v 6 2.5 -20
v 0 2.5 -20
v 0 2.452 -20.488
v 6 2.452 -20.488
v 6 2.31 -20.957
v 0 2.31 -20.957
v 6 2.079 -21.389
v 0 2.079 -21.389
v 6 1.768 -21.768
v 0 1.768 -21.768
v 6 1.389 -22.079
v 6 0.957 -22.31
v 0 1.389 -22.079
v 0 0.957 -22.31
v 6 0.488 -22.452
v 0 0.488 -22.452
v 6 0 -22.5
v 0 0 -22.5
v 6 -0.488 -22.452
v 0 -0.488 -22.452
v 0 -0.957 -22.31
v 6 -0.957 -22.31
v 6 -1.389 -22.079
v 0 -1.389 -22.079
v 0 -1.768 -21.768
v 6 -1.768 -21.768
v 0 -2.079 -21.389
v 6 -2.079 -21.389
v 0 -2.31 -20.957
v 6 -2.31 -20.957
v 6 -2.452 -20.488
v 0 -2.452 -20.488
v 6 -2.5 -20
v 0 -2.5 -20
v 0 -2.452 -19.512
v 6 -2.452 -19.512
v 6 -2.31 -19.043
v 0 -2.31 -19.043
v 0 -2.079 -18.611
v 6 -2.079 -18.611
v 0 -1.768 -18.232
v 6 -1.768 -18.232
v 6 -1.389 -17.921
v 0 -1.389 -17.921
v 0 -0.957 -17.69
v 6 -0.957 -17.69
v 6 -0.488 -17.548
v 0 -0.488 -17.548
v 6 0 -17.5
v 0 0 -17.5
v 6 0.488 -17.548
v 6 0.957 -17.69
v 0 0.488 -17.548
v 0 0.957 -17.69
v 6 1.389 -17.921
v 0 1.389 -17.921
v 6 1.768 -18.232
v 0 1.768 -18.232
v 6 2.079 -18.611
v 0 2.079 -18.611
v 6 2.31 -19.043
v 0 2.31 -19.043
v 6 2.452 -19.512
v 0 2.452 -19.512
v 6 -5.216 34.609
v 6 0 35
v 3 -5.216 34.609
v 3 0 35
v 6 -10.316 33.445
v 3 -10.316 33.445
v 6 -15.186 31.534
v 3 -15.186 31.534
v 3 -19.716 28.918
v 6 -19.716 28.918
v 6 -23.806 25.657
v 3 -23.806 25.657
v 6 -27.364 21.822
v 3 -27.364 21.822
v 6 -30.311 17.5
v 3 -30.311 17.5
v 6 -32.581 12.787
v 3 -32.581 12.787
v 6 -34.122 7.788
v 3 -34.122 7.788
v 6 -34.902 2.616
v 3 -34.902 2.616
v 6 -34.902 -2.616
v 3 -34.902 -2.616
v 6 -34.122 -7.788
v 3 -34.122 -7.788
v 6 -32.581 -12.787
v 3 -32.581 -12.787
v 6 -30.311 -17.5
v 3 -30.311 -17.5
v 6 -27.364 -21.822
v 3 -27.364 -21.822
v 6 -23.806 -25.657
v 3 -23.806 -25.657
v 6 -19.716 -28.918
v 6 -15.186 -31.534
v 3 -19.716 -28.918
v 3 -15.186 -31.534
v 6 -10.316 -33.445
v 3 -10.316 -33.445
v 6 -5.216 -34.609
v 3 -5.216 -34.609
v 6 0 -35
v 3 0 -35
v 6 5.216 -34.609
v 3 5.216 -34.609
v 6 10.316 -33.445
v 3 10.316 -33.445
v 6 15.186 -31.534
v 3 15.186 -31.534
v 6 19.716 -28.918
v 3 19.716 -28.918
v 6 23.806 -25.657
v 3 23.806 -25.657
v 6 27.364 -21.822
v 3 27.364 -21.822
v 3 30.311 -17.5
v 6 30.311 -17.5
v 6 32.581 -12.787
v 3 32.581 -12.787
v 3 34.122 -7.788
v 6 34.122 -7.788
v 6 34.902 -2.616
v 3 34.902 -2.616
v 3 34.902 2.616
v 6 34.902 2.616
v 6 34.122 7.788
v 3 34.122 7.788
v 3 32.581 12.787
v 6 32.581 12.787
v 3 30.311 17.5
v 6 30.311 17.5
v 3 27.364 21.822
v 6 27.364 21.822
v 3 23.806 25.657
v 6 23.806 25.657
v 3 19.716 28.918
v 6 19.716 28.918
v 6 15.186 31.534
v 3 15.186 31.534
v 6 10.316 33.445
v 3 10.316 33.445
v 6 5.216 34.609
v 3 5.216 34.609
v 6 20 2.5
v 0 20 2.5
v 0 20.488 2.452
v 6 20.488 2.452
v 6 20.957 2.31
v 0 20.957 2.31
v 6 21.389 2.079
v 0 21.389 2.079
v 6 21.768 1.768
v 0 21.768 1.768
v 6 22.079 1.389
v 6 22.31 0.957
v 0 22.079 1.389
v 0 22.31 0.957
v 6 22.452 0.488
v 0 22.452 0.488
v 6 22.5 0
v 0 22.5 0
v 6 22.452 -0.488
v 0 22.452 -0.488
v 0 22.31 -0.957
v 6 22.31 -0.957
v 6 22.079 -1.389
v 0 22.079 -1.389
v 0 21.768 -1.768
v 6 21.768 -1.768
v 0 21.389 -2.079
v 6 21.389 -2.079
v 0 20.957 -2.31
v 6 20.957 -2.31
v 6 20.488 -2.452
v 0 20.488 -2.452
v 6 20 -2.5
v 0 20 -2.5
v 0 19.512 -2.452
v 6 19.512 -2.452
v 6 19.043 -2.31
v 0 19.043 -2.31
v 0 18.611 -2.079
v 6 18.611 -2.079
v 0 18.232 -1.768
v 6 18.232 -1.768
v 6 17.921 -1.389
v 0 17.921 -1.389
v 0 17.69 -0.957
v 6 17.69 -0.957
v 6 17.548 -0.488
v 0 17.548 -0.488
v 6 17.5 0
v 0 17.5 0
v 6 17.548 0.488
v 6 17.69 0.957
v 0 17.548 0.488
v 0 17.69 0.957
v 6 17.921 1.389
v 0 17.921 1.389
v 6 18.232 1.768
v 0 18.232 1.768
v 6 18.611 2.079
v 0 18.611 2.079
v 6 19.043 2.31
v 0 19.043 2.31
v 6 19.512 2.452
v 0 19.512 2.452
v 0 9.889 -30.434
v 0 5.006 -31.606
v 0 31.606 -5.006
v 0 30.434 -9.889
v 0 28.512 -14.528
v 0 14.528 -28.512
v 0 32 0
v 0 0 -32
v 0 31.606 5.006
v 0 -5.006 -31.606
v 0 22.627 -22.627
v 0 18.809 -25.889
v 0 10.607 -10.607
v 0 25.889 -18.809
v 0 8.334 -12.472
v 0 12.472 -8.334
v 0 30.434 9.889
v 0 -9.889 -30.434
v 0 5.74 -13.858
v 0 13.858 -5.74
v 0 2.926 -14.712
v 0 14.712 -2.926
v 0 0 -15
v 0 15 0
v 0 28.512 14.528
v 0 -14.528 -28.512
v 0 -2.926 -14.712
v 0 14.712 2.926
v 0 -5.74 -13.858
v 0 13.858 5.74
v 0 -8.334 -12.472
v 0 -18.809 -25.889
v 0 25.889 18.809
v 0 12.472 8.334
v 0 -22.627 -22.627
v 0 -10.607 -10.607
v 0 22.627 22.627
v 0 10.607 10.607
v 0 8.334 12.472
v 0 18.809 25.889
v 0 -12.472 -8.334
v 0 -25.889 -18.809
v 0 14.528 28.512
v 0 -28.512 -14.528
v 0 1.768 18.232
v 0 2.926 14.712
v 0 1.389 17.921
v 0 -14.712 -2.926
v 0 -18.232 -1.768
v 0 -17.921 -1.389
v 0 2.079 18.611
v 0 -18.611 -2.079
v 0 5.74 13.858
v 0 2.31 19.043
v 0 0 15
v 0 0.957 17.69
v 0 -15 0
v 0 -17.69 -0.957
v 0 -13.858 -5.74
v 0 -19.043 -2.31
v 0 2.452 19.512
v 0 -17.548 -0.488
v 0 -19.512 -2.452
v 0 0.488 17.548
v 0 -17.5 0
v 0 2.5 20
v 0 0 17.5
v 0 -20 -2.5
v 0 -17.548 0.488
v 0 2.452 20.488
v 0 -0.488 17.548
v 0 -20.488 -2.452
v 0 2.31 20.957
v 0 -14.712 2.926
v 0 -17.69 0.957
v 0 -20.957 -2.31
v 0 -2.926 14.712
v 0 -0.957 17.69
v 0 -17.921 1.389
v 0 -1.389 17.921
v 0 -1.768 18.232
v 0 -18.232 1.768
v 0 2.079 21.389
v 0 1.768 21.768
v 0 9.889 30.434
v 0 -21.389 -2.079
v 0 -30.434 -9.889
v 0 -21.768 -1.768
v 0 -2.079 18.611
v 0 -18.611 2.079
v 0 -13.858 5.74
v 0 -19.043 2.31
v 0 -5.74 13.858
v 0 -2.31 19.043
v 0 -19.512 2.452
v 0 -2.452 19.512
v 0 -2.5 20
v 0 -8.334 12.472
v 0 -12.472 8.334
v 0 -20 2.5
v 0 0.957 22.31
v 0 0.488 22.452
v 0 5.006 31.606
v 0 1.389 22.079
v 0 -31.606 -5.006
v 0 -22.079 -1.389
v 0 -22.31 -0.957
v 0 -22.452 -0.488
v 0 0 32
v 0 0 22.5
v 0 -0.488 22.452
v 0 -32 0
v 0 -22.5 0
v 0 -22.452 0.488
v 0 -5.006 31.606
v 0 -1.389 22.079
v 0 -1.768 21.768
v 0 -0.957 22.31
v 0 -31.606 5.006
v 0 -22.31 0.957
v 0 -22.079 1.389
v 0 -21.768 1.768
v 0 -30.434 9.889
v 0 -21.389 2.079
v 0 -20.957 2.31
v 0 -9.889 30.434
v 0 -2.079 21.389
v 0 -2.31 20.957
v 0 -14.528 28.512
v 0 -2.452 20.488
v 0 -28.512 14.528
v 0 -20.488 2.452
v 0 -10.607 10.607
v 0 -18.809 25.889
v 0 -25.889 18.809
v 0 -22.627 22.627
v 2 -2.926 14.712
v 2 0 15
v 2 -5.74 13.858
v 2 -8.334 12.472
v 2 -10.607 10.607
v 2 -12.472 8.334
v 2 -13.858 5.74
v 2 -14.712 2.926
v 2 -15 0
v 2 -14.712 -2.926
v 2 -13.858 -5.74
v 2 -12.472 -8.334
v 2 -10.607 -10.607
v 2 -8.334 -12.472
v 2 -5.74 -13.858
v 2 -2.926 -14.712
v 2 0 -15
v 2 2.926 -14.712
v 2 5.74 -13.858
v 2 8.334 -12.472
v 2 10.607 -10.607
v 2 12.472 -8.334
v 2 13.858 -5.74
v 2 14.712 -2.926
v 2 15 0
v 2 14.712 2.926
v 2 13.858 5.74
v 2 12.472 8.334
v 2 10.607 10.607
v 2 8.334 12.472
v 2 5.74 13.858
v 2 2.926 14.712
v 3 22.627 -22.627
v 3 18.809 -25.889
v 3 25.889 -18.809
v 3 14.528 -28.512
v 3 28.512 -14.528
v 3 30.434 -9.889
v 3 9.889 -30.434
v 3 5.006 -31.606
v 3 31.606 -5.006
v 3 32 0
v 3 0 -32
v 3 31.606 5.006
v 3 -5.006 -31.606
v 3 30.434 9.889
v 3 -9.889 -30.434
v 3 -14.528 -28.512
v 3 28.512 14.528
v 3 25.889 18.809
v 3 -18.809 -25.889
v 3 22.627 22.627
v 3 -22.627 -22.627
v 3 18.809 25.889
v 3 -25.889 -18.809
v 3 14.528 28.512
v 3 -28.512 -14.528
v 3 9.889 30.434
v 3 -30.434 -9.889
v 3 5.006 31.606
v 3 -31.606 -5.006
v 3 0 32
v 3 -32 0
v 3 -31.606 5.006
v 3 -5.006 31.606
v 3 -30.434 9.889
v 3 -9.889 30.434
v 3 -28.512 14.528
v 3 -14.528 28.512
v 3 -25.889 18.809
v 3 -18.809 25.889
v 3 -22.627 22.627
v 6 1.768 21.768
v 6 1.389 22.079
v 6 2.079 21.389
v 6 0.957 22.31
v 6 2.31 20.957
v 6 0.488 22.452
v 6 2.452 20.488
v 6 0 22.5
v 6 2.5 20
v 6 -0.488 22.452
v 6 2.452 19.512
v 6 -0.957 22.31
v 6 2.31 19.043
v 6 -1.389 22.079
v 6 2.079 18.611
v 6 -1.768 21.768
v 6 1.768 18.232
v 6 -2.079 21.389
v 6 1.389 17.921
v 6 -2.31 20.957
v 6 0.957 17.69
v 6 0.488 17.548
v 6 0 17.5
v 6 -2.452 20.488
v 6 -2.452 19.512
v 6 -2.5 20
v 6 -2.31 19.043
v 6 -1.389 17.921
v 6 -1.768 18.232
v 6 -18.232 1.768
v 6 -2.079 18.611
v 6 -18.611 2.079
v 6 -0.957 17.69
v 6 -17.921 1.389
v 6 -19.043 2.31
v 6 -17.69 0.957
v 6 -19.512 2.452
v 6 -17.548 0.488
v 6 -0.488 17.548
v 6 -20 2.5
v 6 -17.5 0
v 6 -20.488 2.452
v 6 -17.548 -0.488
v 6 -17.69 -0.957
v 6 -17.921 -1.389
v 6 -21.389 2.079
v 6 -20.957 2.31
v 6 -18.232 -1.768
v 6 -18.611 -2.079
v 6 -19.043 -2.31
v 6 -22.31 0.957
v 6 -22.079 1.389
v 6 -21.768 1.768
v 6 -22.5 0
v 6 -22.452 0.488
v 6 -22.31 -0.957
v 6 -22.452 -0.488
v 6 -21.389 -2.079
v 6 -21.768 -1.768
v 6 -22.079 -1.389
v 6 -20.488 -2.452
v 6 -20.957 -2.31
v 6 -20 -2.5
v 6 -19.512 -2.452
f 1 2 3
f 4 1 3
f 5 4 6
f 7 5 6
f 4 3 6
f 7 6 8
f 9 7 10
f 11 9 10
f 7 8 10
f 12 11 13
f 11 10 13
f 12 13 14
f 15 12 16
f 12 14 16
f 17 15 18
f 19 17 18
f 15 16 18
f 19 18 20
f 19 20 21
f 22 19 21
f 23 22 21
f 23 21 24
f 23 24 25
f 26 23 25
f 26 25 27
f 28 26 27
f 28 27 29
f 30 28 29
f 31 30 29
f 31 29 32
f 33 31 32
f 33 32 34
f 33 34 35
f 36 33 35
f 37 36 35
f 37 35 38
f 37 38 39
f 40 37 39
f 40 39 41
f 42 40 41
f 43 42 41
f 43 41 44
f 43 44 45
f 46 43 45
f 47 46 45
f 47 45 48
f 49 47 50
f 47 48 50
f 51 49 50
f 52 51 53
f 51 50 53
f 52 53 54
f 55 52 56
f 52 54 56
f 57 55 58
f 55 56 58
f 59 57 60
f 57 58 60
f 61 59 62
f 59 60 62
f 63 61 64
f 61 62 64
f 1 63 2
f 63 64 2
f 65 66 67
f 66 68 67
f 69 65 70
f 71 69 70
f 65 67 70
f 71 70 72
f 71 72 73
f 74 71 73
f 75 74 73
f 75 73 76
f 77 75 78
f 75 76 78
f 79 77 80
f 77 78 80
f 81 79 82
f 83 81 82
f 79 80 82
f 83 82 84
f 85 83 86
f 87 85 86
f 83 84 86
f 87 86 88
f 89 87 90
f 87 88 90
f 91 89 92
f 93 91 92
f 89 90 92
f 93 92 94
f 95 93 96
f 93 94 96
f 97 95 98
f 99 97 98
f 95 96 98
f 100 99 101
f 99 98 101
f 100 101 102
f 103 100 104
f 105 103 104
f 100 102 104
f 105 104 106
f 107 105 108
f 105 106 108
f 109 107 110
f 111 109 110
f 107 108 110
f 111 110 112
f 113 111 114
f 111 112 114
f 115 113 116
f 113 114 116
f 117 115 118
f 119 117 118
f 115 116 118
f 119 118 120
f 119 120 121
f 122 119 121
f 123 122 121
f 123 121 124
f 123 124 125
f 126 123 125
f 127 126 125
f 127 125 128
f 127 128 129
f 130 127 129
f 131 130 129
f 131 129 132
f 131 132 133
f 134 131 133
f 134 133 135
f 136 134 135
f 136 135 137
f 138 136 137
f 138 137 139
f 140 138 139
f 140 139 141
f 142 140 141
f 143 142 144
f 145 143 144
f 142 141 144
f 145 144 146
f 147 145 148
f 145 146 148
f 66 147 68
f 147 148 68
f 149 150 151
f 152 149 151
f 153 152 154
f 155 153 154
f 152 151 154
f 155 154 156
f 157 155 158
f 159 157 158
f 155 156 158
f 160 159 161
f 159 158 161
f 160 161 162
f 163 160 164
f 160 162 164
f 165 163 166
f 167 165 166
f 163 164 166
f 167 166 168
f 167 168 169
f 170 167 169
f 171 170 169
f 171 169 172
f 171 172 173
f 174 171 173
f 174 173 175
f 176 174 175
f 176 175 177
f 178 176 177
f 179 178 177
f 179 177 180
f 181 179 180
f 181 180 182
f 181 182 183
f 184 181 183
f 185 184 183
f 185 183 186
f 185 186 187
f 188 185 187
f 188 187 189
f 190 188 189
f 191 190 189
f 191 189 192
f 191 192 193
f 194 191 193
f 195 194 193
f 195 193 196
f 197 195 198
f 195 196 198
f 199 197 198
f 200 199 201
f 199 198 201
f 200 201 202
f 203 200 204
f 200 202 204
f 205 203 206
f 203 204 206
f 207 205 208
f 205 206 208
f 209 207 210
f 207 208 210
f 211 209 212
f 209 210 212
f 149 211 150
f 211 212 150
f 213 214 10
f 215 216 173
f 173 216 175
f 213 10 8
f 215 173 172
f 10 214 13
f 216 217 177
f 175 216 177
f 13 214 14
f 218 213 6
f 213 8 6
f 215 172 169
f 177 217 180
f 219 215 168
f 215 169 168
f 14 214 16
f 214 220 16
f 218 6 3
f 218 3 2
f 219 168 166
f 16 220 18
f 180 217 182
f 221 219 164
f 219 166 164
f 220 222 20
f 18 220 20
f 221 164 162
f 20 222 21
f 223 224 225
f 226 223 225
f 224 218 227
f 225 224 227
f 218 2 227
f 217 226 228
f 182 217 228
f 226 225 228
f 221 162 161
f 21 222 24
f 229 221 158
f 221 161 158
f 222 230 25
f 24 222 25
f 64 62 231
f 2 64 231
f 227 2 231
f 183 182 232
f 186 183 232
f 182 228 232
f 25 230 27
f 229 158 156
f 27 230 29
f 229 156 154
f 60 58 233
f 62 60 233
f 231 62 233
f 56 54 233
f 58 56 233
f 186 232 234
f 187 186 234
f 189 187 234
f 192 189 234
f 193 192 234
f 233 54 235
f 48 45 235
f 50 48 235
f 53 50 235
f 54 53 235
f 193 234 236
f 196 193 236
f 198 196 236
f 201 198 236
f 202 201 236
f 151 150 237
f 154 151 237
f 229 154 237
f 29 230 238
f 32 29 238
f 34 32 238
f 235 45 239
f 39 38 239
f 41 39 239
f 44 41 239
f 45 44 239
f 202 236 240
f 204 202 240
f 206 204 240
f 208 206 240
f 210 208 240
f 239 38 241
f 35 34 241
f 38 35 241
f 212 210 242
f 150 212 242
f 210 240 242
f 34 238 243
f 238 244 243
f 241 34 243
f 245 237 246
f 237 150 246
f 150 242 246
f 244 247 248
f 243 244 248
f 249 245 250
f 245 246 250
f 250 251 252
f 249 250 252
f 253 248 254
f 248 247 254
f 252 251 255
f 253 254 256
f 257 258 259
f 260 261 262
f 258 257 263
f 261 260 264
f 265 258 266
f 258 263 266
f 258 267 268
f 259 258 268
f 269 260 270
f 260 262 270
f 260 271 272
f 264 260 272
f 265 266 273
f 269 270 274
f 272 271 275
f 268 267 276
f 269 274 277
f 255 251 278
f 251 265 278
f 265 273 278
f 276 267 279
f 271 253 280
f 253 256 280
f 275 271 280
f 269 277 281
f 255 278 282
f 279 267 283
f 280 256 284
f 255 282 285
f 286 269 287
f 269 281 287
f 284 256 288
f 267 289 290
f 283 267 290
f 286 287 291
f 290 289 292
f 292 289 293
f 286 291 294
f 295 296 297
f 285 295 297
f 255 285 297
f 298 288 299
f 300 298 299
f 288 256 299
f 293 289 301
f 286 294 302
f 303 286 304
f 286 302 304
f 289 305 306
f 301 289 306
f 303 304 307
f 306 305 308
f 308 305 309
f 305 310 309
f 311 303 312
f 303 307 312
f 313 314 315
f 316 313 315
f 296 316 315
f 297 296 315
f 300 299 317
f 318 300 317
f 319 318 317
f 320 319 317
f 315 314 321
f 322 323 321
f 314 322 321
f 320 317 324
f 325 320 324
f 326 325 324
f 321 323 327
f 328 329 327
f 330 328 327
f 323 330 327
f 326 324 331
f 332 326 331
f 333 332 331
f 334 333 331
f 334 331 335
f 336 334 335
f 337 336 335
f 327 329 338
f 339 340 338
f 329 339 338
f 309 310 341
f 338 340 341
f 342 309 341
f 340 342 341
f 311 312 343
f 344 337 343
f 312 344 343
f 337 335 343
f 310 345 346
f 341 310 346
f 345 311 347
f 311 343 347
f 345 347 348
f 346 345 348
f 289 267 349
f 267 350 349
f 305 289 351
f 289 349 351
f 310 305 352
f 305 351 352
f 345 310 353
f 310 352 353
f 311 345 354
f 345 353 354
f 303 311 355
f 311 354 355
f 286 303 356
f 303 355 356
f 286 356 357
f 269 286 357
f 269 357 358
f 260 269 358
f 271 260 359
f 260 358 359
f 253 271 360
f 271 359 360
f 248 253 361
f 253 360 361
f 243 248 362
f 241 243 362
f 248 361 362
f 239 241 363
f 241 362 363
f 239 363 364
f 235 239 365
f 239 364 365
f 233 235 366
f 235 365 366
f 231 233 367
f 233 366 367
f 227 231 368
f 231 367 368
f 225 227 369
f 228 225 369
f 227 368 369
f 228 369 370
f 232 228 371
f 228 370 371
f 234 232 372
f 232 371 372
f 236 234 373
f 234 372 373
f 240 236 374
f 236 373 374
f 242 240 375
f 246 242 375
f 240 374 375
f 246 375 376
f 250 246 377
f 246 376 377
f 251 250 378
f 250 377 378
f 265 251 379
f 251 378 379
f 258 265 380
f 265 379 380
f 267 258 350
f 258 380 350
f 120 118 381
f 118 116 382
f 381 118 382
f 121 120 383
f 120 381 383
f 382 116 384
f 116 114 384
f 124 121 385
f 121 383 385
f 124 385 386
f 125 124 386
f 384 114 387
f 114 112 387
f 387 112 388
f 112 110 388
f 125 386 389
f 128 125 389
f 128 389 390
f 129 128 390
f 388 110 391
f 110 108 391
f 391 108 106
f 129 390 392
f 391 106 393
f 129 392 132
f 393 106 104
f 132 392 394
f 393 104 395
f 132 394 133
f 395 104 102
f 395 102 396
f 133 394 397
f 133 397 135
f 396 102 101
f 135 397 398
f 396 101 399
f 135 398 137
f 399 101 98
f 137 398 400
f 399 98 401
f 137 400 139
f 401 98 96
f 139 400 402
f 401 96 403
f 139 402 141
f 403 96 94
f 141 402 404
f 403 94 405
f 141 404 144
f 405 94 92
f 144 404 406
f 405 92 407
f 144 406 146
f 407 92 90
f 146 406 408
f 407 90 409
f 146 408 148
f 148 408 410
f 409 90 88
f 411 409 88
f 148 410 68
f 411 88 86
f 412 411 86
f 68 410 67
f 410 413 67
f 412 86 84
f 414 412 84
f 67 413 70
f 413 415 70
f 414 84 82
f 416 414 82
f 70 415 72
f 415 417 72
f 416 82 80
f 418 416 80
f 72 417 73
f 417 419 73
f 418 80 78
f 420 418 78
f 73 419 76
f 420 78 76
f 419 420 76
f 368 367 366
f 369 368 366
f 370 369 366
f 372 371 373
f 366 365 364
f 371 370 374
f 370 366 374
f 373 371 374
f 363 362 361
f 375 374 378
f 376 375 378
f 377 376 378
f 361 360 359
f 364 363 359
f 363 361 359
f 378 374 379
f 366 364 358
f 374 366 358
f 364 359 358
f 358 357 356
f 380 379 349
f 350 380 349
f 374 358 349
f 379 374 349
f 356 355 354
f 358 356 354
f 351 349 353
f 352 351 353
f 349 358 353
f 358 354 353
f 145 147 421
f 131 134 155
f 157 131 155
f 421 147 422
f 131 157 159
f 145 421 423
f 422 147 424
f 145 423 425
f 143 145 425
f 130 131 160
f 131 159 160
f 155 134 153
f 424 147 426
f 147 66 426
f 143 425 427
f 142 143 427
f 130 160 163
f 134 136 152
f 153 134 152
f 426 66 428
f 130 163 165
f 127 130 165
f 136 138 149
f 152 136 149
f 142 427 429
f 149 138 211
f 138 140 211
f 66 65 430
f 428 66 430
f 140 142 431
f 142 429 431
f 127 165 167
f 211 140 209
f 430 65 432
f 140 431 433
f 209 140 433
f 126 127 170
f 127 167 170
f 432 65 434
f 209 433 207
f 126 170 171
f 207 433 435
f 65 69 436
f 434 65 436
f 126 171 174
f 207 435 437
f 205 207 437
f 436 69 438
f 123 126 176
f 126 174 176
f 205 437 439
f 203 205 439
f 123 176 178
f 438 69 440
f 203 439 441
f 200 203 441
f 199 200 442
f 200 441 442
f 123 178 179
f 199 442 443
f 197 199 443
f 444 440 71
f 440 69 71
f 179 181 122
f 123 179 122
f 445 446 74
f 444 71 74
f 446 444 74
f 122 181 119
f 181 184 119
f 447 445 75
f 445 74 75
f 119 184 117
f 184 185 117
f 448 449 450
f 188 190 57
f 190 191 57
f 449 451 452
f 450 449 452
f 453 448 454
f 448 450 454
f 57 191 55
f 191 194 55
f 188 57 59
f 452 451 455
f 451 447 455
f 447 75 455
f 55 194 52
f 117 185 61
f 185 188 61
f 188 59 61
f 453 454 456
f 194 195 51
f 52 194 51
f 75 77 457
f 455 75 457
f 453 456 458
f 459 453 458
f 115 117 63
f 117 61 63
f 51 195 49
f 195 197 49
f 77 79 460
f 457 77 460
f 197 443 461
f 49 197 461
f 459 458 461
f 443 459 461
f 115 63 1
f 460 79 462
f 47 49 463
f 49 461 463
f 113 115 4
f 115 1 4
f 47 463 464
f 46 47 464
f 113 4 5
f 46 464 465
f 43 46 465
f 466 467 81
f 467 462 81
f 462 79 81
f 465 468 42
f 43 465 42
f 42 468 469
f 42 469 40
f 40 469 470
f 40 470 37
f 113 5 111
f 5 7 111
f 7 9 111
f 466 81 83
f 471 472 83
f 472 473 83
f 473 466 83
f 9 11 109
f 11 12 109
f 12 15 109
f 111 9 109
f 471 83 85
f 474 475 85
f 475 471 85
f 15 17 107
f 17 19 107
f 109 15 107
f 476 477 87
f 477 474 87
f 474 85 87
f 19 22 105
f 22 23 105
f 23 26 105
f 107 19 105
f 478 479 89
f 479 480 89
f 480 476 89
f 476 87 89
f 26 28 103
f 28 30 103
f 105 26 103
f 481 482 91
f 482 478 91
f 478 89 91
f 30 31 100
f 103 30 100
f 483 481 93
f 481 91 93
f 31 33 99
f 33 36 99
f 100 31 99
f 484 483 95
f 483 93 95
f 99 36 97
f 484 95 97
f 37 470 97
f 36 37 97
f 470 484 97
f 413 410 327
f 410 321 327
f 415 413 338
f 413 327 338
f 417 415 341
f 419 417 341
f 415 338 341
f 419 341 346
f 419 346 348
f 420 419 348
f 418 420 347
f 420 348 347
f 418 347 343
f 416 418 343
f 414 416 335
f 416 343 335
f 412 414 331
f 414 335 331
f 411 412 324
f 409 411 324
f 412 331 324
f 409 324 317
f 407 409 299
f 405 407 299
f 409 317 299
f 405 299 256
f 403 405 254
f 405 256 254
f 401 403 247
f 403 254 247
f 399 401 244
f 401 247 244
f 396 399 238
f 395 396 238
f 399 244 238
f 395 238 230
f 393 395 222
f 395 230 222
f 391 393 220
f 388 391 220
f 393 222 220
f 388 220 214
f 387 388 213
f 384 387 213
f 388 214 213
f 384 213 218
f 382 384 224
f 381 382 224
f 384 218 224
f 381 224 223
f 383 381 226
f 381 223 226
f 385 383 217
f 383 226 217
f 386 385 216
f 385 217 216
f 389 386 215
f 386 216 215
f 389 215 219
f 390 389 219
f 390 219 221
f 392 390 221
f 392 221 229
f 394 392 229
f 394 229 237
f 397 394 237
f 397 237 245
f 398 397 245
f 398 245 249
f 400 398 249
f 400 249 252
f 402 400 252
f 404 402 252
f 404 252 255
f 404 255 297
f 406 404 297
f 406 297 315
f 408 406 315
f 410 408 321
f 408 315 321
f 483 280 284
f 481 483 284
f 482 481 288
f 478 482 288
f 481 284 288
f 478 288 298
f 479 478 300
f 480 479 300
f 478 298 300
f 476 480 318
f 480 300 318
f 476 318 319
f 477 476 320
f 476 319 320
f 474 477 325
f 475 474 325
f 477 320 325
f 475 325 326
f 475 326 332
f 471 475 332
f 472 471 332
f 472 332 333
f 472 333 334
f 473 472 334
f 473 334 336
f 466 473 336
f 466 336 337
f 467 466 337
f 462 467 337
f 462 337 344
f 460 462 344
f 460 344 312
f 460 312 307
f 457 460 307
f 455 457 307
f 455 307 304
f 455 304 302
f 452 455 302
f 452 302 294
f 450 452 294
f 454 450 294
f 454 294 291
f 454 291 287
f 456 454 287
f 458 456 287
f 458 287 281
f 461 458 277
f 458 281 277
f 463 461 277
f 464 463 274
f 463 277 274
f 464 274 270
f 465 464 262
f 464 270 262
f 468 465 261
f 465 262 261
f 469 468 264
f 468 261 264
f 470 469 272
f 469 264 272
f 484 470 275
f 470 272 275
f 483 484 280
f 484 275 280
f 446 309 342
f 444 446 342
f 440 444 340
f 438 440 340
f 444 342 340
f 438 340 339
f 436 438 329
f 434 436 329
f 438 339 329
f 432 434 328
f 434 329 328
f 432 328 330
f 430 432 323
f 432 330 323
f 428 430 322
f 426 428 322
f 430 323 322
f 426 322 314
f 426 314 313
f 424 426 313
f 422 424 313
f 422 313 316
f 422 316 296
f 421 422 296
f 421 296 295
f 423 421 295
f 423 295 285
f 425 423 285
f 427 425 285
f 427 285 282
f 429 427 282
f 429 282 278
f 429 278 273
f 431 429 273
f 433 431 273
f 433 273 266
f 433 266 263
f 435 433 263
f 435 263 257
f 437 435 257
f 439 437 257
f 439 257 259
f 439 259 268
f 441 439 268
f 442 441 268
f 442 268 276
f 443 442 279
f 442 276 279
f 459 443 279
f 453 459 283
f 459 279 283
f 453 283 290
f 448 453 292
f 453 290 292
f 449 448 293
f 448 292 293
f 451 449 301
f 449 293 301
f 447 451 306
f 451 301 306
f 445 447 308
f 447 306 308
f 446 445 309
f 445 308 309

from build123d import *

# Parameters (mm, degrees)
SKETCH_2_R               = 2.5
CUT_EXTRUDE_1_DEPTH      = 33.3
PATTERN_CIRCULAR_1_COUNT = 4


with BuildPart() as part:
    # Эскиз1 → Повернуть1 (revolve)
    with BuildSketch(Plane.XY, mode=Mode.PRIVATE) as revolve_1_sk:
        Polygon((6, 0), (6, 35), (3, 35), (3, 32), (0, 32), (0, 15), (2, 15), (2, 0), align=None)
    revolve(revolve_1_sk.sketch.rotate(Axis((0, 0, 0), (1, 0, 0)), 90), axis=Axis((0, 0, 0), (1, 0, 0)))

    # Эскиз2 → Вырез-Вытянуть1 (cut)
    with BuildSketch(Plane.ZY):
        with Locations((0, 20)):
            Circle(SKETCH_2_R)
    cut_extrude_1 = extrude(amount=-CUT_EXTRUDE_1_DEPTH, mode=Mode.SUBTRACT)

    # Круговой массив1: Вырез-Вытянуть1 ×4 about axis
    pattern_circular_1_axis = Axis((0, 0, 0), (1, 0, 0))
    for i in range(1, PATTERN_CIRCULAR_1_COUNT):
        add(cut_extrude_1.rotate(pattern_circular_1_axis, i * 360 / PATTERN_CIRCULAR_1_COUNT), mode=Mode.SUBTRACT)


solid = part.part
